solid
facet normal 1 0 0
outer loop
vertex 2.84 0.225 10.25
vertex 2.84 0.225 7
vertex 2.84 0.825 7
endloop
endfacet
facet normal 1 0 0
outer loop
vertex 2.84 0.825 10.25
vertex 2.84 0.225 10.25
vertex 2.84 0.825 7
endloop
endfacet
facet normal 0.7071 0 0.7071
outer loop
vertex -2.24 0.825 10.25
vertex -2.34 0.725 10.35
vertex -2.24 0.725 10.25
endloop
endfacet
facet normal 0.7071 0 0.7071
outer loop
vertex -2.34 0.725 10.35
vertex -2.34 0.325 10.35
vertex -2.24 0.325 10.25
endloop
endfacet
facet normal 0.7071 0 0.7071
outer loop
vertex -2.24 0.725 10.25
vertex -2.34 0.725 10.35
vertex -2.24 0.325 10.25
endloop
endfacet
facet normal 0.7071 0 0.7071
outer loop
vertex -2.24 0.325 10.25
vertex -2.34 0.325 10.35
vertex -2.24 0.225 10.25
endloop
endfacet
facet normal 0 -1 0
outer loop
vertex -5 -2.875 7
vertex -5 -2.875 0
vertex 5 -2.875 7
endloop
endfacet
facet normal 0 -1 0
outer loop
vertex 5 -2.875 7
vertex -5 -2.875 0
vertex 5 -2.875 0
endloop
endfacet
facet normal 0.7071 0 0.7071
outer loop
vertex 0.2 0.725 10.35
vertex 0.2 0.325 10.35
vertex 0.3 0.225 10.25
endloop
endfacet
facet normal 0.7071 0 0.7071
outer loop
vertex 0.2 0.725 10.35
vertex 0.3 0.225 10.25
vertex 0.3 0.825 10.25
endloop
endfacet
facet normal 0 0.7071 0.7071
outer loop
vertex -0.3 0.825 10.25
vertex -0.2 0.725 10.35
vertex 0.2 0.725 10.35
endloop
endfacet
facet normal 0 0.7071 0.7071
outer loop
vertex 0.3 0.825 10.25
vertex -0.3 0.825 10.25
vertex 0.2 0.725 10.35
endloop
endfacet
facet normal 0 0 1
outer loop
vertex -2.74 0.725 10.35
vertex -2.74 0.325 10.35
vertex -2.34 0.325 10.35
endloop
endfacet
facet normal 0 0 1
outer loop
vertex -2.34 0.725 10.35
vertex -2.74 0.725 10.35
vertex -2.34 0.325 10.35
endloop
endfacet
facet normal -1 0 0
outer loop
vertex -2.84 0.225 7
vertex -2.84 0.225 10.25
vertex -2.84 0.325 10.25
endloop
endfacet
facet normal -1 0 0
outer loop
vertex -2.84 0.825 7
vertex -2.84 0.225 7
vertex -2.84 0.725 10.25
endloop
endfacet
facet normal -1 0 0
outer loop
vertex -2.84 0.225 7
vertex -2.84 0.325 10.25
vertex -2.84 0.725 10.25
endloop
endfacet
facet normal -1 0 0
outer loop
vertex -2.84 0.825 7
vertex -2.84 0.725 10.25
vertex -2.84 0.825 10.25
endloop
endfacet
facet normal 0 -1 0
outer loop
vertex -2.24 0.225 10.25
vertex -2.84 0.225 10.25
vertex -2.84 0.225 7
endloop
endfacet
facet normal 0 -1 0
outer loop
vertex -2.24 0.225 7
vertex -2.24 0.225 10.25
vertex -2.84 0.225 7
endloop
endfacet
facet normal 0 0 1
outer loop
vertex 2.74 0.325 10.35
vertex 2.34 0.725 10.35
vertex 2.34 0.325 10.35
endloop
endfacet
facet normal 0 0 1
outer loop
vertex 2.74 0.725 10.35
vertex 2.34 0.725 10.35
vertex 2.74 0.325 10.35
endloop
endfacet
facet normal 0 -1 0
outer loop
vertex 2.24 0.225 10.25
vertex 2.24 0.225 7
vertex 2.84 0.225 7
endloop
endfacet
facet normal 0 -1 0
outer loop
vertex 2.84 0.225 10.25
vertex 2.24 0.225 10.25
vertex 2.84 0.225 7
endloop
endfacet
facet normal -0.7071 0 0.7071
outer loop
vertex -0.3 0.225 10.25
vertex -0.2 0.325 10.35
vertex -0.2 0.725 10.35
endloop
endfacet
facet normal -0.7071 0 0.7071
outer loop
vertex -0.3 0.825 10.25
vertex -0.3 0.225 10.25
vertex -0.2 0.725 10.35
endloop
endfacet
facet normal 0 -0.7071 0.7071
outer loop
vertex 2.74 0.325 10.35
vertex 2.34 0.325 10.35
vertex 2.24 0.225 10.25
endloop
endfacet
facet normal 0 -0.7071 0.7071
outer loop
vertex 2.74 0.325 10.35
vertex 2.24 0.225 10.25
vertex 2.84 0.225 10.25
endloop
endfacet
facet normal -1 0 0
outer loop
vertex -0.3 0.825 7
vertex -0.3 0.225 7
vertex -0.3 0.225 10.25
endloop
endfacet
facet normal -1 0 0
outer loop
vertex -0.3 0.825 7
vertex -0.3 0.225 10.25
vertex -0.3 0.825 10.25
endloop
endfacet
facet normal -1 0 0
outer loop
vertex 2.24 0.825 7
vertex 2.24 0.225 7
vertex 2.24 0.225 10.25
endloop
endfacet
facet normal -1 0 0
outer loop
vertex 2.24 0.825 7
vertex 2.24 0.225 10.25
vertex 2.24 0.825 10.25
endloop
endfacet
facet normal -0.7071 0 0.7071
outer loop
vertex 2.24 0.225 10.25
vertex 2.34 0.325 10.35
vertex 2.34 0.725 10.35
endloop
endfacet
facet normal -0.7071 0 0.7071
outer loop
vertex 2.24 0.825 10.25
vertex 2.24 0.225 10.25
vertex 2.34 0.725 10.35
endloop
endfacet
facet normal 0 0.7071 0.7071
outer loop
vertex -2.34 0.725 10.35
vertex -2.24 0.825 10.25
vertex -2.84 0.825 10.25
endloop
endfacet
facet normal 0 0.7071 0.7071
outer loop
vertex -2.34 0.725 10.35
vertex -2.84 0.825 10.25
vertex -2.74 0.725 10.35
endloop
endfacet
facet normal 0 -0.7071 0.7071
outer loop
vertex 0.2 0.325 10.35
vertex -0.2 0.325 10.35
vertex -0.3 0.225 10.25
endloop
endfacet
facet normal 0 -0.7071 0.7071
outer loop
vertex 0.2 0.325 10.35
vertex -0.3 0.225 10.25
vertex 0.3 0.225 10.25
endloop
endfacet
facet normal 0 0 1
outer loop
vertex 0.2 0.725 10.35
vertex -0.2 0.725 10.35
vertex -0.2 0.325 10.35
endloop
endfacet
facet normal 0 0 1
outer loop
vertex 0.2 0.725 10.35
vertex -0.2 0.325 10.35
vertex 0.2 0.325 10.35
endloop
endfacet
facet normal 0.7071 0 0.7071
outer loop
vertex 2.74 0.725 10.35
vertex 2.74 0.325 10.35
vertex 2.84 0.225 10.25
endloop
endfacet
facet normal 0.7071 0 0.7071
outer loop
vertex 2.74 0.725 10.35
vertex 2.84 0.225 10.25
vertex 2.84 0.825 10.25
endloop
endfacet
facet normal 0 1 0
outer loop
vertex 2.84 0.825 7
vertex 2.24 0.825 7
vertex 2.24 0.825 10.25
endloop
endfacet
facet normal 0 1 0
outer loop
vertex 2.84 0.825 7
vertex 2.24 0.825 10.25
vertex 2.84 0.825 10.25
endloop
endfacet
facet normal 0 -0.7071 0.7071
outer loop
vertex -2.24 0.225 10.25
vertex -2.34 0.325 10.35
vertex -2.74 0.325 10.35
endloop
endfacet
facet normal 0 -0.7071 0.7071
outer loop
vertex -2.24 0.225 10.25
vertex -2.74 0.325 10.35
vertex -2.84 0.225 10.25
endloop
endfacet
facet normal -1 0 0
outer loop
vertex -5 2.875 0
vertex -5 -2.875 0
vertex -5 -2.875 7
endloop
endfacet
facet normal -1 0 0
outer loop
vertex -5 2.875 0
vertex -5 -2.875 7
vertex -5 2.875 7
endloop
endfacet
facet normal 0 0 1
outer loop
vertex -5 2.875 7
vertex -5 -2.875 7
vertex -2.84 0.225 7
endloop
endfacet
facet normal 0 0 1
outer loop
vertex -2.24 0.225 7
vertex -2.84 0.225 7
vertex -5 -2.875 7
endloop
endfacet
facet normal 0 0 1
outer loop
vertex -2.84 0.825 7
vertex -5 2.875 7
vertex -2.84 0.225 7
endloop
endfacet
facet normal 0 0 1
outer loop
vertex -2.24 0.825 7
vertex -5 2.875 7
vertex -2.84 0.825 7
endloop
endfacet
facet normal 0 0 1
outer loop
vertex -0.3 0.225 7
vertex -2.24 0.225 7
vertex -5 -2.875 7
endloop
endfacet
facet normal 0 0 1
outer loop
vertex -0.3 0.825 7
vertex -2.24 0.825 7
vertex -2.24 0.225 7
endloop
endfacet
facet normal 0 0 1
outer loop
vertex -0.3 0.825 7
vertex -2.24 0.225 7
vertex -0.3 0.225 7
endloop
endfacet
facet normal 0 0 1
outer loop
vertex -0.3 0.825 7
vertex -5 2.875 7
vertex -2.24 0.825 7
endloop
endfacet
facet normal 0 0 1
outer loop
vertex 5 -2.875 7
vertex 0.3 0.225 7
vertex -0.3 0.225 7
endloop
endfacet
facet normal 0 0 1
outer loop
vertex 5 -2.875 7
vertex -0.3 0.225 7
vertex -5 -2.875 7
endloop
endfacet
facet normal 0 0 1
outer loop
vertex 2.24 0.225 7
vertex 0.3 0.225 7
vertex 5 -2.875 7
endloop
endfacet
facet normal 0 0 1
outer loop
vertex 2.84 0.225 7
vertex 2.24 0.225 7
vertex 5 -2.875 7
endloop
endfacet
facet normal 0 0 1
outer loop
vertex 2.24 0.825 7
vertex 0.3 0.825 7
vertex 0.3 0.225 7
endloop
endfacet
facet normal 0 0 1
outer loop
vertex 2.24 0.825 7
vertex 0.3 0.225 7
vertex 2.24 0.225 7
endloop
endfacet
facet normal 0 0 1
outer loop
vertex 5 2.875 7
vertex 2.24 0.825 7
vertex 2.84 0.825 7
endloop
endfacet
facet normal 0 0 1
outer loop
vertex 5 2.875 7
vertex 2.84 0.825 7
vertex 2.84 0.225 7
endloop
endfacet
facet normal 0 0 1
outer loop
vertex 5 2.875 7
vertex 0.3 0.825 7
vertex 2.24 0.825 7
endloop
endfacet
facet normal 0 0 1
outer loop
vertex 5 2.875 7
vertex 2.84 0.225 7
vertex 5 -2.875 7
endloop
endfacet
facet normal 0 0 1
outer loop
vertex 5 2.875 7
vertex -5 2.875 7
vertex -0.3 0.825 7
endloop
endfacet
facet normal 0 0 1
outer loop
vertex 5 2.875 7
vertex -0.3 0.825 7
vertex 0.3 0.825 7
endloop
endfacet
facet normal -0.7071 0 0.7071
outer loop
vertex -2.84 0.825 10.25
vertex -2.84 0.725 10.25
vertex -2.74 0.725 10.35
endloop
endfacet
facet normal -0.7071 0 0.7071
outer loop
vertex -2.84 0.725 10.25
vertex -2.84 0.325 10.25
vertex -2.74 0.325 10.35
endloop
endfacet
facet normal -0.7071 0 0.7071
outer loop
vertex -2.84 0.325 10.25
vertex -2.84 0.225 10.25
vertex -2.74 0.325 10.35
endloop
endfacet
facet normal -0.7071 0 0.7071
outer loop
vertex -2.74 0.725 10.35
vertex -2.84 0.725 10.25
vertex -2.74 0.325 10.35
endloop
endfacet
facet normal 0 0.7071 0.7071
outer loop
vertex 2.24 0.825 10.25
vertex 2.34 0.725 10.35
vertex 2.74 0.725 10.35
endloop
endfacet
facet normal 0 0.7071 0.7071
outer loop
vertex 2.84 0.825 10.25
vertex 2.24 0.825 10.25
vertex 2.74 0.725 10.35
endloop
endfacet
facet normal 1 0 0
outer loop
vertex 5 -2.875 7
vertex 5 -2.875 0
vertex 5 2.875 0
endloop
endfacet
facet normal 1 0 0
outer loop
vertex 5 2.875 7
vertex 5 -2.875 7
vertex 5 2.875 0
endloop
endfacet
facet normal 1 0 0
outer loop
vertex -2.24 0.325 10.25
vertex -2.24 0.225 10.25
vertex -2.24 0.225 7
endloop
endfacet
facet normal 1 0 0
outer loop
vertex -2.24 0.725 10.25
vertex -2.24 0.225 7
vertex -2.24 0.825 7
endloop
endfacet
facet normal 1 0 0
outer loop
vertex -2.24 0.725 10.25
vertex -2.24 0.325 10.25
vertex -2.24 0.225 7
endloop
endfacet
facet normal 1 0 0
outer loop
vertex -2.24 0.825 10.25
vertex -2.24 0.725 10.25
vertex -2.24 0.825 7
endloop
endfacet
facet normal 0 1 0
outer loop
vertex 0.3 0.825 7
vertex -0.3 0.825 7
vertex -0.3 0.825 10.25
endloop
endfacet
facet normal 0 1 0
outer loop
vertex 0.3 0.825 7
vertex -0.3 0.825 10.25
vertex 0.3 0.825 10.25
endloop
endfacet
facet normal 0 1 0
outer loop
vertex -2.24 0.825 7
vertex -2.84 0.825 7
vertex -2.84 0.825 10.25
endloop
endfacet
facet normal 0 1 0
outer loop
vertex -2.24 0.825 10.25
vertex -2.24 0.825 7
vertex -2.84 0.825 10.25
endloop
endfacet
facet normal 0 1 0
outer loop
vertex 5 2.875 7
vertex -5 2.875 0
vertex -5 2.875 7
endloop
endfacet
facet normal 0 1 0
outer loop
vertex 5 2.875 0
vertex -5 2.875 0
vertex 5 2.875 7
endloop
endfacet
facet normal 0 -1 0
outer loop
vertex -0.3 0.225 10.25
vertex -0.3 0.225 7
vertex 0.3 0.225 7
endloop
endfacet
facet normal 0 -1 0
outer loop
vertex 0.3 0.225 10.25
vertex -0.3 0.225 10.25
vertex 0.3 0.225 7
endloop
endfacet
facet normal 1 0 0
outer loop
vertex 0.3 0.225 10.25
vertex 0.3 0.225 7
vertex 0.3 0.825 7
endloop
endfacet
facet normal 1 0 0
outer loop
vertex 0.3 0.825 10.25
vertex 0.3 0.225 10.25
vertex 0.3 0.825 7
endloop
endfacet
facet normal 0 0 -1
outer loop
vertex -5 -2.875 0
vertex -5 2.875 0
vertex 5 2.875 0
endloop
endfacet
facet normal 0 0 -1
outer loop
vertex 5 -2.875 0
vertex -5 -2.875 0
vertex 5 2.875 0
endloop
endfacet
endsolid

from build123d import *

# Parameters (mm, degrees)
ESBO_O1_W                       = 10
ESBO_O1_H                       = 5.75
RESSALTO_EXTRUS_O1_DEPTH        = 7
ESBO_O2_W                       = 0.6
ESBO_O2_H                       = 0.6
RESSALTO_EXTRUS_O2_DEPTH        = 3.35
CHANFRO1_SIZE                   = 0.1
PADR_O_LINEAR1_COUNT            = 2
PADR_O_LINEAR1_PITCH            = 2.54
CHANFRO1_OF_PADR_O_LINEAR1_SIZE = 0.1
PADR_O_START                    = 0.325
PADR_O_LINEAR2_DEPTH            = 0.4
PADR_O_START_2                  = -2.84
PADR_O_LINEAR2_2_DEPTH          = 0.6
PADR_O_START_3                  = -9.256027766
PADR_O_LINEAR2_3_OUTLINE_W      = 1.336074683
PADR_O_LINEAR2_3_OUTLINE_H      = 1.275
PADR_O_LINEAR2_3_OUTLINE_H_2    = 1.325
PADR_O_LINEAR2_3_DEPTH          = 1.256027766
PADR_O_START_4                  = -10
PADR_O_LINEAR2_4_OUTLINE_W      = 1.663925317
PADR_O_LINEAR2_4_OUTLINE_H      = 1.275
PADR_O_LINEAR2_4_OUTLINE_H_2    = 1.325
PADR_O_LINEAR2_4_DEPTH          = 0.743972234


with BuildPart() as part:
    # Esboço1 → Ressalto-extrusão1 (new body)
    with BuildSketch(Plane.XY):
        Rectangle(ESBO_O1_W, ESBO_O1_H)
    extrude(amount=RESSALTO_EXTRUS_O1_DEPTH)

    # Esboço2 → Ressalto-extrusão2 (add)
    with BuildSketch(Plane.XY.offset(7)):
        with Locations((0, 0.525)):
            Rectangle(ESBO_O2_W, ESBO_O2_H)
    ressalto_extrus_o2 = extrude(amount=RESSALTO_EXTRUS_O2_DEPTH)

    # Chanfro1
    chanfro1_edges = [part.edges().sort_by_distance(p)[0] for p in [
        (0.3, 0.525, 10.35),
        (0, 0.825, 10.35),
        (-0.3, 0.525, 10.35),
        (0, 0.225, 10.35),
    ]]
    chamfer(chanfro1_edges, length=CHANFRO1_SIZE)

    # Padrão linear1: Ressalto-extrusão2 ×2
    with Locations(*[(i * PADR_O_LINEAR1_PITCH, 0, 0) for i in range(1, PADR_O_LINEAR1_COUNT)]):
        add(ressalto_extrus_o2)

    # Chanfro1 of Padrão linear1
    chanfro1_of_padr_o_linear1_edges = [part.edges().sort_by_distance(p)[0] for p in [
        (2.84, 0.525, 10.35),
        (2.54, 0.825, 10.35),
        (2.24, 0.525, 10.35),
        (2.54, 0.225, 10.35),
    ]]
    chamfer(chanfro1_of_padr_o_linear1_edges, length=CHANFRO1_OF_PADR_O_LINEAR1_SIZE)

    # Padrão linear2: read off the stored shape, not the designer's step
    # Padrão linear2 outline → Padrão linear2 (add)
    with BuildSketch(Plane(origin=(0, 0, 0), x_dir=(1, 0, 0), z_dir=(0, 1, 0)).offset(PADR_O_START)):
        Polygon((-2.84, -10.25), (-2.74, -10.35), (-2.34, -10.35), (-2.24, -10.25), (-2.24, -7), (-2.84, -7), align=None)
    extrude(amount=PADR_O_LINEAR2_DEPTH)

    # Padr_o linear2 2 outline → Padr_o linear2 2 (add)
    with BuildSketch(Plane.YZ.offset(PADR_O_START_2)):
        Polygon((0.225, 7), (0.325, 7), (0.325, 10.35), (0.225, 10.25), align=None)
        Polygon((0.825, 7), (0.825, 10.25), (0.725, 10.35), (0.725, 7), align=None)
    extrude(amount=PADR_O_LINEAR2_2_DEPTH)

    # Padr_o linear2 3 outline → Padr_o linear2 3 (cut)
    with BuildSketch(Plane(origin=(0, 0, 0), x_dir=(0.7071067811865471, 0, 0.707106781186548), z_dir=(0.707106781186548, 0, -0.707106781186547)).offset(PADR_O_START_3)):
        with Locations((6.331962659, -1.3625)):
            Rectangle(PADR_O_LINEAR2_3_OUTLINE_W, PADR_O_LINEAR2_3_OUTLINE_H)
        with Locations((6.331962659, 0.3375)):
            Rectangle(PADR_O_LINEAR2_3_OUTLINE_W, PADR_O_LINEAR2_3_OUTLINE_H_2)
    extrude(amount=PADR_O_LINEAR2_3_DEPTH, mode=Mode.SUBTRACT)

    # Padr_o linear2 4 outline → Padr_o linear2 4 (cut)
    with BuildSketch(Plane(origin=(0, 0, 0), x_dir=(0.7071067811865471, 0, 0.707106781186548), z_dir=(0.707106781186548, 0, -0.707106781186547)).offset(PADR_O_START_4)):
        with Locations((4.831962659, -1.3625)):
            Rectangle(PADR_O_LINEAR2_4_OUTLINE_W, PADR_O_LINEAR2_4_OUTLINE_H)
        with Locations((4.831962659, 0.3375)):
            Rectangle(PADR_O_LINEAR2_4_OUTLINE_W, PADR_O_LINEAR2_4_OUTLINE_H_2)
    extrude(amount=PADR_O_LINEAR2_4_DEPTH, mode=Mode.SUBTRACT)


solid = part.part
